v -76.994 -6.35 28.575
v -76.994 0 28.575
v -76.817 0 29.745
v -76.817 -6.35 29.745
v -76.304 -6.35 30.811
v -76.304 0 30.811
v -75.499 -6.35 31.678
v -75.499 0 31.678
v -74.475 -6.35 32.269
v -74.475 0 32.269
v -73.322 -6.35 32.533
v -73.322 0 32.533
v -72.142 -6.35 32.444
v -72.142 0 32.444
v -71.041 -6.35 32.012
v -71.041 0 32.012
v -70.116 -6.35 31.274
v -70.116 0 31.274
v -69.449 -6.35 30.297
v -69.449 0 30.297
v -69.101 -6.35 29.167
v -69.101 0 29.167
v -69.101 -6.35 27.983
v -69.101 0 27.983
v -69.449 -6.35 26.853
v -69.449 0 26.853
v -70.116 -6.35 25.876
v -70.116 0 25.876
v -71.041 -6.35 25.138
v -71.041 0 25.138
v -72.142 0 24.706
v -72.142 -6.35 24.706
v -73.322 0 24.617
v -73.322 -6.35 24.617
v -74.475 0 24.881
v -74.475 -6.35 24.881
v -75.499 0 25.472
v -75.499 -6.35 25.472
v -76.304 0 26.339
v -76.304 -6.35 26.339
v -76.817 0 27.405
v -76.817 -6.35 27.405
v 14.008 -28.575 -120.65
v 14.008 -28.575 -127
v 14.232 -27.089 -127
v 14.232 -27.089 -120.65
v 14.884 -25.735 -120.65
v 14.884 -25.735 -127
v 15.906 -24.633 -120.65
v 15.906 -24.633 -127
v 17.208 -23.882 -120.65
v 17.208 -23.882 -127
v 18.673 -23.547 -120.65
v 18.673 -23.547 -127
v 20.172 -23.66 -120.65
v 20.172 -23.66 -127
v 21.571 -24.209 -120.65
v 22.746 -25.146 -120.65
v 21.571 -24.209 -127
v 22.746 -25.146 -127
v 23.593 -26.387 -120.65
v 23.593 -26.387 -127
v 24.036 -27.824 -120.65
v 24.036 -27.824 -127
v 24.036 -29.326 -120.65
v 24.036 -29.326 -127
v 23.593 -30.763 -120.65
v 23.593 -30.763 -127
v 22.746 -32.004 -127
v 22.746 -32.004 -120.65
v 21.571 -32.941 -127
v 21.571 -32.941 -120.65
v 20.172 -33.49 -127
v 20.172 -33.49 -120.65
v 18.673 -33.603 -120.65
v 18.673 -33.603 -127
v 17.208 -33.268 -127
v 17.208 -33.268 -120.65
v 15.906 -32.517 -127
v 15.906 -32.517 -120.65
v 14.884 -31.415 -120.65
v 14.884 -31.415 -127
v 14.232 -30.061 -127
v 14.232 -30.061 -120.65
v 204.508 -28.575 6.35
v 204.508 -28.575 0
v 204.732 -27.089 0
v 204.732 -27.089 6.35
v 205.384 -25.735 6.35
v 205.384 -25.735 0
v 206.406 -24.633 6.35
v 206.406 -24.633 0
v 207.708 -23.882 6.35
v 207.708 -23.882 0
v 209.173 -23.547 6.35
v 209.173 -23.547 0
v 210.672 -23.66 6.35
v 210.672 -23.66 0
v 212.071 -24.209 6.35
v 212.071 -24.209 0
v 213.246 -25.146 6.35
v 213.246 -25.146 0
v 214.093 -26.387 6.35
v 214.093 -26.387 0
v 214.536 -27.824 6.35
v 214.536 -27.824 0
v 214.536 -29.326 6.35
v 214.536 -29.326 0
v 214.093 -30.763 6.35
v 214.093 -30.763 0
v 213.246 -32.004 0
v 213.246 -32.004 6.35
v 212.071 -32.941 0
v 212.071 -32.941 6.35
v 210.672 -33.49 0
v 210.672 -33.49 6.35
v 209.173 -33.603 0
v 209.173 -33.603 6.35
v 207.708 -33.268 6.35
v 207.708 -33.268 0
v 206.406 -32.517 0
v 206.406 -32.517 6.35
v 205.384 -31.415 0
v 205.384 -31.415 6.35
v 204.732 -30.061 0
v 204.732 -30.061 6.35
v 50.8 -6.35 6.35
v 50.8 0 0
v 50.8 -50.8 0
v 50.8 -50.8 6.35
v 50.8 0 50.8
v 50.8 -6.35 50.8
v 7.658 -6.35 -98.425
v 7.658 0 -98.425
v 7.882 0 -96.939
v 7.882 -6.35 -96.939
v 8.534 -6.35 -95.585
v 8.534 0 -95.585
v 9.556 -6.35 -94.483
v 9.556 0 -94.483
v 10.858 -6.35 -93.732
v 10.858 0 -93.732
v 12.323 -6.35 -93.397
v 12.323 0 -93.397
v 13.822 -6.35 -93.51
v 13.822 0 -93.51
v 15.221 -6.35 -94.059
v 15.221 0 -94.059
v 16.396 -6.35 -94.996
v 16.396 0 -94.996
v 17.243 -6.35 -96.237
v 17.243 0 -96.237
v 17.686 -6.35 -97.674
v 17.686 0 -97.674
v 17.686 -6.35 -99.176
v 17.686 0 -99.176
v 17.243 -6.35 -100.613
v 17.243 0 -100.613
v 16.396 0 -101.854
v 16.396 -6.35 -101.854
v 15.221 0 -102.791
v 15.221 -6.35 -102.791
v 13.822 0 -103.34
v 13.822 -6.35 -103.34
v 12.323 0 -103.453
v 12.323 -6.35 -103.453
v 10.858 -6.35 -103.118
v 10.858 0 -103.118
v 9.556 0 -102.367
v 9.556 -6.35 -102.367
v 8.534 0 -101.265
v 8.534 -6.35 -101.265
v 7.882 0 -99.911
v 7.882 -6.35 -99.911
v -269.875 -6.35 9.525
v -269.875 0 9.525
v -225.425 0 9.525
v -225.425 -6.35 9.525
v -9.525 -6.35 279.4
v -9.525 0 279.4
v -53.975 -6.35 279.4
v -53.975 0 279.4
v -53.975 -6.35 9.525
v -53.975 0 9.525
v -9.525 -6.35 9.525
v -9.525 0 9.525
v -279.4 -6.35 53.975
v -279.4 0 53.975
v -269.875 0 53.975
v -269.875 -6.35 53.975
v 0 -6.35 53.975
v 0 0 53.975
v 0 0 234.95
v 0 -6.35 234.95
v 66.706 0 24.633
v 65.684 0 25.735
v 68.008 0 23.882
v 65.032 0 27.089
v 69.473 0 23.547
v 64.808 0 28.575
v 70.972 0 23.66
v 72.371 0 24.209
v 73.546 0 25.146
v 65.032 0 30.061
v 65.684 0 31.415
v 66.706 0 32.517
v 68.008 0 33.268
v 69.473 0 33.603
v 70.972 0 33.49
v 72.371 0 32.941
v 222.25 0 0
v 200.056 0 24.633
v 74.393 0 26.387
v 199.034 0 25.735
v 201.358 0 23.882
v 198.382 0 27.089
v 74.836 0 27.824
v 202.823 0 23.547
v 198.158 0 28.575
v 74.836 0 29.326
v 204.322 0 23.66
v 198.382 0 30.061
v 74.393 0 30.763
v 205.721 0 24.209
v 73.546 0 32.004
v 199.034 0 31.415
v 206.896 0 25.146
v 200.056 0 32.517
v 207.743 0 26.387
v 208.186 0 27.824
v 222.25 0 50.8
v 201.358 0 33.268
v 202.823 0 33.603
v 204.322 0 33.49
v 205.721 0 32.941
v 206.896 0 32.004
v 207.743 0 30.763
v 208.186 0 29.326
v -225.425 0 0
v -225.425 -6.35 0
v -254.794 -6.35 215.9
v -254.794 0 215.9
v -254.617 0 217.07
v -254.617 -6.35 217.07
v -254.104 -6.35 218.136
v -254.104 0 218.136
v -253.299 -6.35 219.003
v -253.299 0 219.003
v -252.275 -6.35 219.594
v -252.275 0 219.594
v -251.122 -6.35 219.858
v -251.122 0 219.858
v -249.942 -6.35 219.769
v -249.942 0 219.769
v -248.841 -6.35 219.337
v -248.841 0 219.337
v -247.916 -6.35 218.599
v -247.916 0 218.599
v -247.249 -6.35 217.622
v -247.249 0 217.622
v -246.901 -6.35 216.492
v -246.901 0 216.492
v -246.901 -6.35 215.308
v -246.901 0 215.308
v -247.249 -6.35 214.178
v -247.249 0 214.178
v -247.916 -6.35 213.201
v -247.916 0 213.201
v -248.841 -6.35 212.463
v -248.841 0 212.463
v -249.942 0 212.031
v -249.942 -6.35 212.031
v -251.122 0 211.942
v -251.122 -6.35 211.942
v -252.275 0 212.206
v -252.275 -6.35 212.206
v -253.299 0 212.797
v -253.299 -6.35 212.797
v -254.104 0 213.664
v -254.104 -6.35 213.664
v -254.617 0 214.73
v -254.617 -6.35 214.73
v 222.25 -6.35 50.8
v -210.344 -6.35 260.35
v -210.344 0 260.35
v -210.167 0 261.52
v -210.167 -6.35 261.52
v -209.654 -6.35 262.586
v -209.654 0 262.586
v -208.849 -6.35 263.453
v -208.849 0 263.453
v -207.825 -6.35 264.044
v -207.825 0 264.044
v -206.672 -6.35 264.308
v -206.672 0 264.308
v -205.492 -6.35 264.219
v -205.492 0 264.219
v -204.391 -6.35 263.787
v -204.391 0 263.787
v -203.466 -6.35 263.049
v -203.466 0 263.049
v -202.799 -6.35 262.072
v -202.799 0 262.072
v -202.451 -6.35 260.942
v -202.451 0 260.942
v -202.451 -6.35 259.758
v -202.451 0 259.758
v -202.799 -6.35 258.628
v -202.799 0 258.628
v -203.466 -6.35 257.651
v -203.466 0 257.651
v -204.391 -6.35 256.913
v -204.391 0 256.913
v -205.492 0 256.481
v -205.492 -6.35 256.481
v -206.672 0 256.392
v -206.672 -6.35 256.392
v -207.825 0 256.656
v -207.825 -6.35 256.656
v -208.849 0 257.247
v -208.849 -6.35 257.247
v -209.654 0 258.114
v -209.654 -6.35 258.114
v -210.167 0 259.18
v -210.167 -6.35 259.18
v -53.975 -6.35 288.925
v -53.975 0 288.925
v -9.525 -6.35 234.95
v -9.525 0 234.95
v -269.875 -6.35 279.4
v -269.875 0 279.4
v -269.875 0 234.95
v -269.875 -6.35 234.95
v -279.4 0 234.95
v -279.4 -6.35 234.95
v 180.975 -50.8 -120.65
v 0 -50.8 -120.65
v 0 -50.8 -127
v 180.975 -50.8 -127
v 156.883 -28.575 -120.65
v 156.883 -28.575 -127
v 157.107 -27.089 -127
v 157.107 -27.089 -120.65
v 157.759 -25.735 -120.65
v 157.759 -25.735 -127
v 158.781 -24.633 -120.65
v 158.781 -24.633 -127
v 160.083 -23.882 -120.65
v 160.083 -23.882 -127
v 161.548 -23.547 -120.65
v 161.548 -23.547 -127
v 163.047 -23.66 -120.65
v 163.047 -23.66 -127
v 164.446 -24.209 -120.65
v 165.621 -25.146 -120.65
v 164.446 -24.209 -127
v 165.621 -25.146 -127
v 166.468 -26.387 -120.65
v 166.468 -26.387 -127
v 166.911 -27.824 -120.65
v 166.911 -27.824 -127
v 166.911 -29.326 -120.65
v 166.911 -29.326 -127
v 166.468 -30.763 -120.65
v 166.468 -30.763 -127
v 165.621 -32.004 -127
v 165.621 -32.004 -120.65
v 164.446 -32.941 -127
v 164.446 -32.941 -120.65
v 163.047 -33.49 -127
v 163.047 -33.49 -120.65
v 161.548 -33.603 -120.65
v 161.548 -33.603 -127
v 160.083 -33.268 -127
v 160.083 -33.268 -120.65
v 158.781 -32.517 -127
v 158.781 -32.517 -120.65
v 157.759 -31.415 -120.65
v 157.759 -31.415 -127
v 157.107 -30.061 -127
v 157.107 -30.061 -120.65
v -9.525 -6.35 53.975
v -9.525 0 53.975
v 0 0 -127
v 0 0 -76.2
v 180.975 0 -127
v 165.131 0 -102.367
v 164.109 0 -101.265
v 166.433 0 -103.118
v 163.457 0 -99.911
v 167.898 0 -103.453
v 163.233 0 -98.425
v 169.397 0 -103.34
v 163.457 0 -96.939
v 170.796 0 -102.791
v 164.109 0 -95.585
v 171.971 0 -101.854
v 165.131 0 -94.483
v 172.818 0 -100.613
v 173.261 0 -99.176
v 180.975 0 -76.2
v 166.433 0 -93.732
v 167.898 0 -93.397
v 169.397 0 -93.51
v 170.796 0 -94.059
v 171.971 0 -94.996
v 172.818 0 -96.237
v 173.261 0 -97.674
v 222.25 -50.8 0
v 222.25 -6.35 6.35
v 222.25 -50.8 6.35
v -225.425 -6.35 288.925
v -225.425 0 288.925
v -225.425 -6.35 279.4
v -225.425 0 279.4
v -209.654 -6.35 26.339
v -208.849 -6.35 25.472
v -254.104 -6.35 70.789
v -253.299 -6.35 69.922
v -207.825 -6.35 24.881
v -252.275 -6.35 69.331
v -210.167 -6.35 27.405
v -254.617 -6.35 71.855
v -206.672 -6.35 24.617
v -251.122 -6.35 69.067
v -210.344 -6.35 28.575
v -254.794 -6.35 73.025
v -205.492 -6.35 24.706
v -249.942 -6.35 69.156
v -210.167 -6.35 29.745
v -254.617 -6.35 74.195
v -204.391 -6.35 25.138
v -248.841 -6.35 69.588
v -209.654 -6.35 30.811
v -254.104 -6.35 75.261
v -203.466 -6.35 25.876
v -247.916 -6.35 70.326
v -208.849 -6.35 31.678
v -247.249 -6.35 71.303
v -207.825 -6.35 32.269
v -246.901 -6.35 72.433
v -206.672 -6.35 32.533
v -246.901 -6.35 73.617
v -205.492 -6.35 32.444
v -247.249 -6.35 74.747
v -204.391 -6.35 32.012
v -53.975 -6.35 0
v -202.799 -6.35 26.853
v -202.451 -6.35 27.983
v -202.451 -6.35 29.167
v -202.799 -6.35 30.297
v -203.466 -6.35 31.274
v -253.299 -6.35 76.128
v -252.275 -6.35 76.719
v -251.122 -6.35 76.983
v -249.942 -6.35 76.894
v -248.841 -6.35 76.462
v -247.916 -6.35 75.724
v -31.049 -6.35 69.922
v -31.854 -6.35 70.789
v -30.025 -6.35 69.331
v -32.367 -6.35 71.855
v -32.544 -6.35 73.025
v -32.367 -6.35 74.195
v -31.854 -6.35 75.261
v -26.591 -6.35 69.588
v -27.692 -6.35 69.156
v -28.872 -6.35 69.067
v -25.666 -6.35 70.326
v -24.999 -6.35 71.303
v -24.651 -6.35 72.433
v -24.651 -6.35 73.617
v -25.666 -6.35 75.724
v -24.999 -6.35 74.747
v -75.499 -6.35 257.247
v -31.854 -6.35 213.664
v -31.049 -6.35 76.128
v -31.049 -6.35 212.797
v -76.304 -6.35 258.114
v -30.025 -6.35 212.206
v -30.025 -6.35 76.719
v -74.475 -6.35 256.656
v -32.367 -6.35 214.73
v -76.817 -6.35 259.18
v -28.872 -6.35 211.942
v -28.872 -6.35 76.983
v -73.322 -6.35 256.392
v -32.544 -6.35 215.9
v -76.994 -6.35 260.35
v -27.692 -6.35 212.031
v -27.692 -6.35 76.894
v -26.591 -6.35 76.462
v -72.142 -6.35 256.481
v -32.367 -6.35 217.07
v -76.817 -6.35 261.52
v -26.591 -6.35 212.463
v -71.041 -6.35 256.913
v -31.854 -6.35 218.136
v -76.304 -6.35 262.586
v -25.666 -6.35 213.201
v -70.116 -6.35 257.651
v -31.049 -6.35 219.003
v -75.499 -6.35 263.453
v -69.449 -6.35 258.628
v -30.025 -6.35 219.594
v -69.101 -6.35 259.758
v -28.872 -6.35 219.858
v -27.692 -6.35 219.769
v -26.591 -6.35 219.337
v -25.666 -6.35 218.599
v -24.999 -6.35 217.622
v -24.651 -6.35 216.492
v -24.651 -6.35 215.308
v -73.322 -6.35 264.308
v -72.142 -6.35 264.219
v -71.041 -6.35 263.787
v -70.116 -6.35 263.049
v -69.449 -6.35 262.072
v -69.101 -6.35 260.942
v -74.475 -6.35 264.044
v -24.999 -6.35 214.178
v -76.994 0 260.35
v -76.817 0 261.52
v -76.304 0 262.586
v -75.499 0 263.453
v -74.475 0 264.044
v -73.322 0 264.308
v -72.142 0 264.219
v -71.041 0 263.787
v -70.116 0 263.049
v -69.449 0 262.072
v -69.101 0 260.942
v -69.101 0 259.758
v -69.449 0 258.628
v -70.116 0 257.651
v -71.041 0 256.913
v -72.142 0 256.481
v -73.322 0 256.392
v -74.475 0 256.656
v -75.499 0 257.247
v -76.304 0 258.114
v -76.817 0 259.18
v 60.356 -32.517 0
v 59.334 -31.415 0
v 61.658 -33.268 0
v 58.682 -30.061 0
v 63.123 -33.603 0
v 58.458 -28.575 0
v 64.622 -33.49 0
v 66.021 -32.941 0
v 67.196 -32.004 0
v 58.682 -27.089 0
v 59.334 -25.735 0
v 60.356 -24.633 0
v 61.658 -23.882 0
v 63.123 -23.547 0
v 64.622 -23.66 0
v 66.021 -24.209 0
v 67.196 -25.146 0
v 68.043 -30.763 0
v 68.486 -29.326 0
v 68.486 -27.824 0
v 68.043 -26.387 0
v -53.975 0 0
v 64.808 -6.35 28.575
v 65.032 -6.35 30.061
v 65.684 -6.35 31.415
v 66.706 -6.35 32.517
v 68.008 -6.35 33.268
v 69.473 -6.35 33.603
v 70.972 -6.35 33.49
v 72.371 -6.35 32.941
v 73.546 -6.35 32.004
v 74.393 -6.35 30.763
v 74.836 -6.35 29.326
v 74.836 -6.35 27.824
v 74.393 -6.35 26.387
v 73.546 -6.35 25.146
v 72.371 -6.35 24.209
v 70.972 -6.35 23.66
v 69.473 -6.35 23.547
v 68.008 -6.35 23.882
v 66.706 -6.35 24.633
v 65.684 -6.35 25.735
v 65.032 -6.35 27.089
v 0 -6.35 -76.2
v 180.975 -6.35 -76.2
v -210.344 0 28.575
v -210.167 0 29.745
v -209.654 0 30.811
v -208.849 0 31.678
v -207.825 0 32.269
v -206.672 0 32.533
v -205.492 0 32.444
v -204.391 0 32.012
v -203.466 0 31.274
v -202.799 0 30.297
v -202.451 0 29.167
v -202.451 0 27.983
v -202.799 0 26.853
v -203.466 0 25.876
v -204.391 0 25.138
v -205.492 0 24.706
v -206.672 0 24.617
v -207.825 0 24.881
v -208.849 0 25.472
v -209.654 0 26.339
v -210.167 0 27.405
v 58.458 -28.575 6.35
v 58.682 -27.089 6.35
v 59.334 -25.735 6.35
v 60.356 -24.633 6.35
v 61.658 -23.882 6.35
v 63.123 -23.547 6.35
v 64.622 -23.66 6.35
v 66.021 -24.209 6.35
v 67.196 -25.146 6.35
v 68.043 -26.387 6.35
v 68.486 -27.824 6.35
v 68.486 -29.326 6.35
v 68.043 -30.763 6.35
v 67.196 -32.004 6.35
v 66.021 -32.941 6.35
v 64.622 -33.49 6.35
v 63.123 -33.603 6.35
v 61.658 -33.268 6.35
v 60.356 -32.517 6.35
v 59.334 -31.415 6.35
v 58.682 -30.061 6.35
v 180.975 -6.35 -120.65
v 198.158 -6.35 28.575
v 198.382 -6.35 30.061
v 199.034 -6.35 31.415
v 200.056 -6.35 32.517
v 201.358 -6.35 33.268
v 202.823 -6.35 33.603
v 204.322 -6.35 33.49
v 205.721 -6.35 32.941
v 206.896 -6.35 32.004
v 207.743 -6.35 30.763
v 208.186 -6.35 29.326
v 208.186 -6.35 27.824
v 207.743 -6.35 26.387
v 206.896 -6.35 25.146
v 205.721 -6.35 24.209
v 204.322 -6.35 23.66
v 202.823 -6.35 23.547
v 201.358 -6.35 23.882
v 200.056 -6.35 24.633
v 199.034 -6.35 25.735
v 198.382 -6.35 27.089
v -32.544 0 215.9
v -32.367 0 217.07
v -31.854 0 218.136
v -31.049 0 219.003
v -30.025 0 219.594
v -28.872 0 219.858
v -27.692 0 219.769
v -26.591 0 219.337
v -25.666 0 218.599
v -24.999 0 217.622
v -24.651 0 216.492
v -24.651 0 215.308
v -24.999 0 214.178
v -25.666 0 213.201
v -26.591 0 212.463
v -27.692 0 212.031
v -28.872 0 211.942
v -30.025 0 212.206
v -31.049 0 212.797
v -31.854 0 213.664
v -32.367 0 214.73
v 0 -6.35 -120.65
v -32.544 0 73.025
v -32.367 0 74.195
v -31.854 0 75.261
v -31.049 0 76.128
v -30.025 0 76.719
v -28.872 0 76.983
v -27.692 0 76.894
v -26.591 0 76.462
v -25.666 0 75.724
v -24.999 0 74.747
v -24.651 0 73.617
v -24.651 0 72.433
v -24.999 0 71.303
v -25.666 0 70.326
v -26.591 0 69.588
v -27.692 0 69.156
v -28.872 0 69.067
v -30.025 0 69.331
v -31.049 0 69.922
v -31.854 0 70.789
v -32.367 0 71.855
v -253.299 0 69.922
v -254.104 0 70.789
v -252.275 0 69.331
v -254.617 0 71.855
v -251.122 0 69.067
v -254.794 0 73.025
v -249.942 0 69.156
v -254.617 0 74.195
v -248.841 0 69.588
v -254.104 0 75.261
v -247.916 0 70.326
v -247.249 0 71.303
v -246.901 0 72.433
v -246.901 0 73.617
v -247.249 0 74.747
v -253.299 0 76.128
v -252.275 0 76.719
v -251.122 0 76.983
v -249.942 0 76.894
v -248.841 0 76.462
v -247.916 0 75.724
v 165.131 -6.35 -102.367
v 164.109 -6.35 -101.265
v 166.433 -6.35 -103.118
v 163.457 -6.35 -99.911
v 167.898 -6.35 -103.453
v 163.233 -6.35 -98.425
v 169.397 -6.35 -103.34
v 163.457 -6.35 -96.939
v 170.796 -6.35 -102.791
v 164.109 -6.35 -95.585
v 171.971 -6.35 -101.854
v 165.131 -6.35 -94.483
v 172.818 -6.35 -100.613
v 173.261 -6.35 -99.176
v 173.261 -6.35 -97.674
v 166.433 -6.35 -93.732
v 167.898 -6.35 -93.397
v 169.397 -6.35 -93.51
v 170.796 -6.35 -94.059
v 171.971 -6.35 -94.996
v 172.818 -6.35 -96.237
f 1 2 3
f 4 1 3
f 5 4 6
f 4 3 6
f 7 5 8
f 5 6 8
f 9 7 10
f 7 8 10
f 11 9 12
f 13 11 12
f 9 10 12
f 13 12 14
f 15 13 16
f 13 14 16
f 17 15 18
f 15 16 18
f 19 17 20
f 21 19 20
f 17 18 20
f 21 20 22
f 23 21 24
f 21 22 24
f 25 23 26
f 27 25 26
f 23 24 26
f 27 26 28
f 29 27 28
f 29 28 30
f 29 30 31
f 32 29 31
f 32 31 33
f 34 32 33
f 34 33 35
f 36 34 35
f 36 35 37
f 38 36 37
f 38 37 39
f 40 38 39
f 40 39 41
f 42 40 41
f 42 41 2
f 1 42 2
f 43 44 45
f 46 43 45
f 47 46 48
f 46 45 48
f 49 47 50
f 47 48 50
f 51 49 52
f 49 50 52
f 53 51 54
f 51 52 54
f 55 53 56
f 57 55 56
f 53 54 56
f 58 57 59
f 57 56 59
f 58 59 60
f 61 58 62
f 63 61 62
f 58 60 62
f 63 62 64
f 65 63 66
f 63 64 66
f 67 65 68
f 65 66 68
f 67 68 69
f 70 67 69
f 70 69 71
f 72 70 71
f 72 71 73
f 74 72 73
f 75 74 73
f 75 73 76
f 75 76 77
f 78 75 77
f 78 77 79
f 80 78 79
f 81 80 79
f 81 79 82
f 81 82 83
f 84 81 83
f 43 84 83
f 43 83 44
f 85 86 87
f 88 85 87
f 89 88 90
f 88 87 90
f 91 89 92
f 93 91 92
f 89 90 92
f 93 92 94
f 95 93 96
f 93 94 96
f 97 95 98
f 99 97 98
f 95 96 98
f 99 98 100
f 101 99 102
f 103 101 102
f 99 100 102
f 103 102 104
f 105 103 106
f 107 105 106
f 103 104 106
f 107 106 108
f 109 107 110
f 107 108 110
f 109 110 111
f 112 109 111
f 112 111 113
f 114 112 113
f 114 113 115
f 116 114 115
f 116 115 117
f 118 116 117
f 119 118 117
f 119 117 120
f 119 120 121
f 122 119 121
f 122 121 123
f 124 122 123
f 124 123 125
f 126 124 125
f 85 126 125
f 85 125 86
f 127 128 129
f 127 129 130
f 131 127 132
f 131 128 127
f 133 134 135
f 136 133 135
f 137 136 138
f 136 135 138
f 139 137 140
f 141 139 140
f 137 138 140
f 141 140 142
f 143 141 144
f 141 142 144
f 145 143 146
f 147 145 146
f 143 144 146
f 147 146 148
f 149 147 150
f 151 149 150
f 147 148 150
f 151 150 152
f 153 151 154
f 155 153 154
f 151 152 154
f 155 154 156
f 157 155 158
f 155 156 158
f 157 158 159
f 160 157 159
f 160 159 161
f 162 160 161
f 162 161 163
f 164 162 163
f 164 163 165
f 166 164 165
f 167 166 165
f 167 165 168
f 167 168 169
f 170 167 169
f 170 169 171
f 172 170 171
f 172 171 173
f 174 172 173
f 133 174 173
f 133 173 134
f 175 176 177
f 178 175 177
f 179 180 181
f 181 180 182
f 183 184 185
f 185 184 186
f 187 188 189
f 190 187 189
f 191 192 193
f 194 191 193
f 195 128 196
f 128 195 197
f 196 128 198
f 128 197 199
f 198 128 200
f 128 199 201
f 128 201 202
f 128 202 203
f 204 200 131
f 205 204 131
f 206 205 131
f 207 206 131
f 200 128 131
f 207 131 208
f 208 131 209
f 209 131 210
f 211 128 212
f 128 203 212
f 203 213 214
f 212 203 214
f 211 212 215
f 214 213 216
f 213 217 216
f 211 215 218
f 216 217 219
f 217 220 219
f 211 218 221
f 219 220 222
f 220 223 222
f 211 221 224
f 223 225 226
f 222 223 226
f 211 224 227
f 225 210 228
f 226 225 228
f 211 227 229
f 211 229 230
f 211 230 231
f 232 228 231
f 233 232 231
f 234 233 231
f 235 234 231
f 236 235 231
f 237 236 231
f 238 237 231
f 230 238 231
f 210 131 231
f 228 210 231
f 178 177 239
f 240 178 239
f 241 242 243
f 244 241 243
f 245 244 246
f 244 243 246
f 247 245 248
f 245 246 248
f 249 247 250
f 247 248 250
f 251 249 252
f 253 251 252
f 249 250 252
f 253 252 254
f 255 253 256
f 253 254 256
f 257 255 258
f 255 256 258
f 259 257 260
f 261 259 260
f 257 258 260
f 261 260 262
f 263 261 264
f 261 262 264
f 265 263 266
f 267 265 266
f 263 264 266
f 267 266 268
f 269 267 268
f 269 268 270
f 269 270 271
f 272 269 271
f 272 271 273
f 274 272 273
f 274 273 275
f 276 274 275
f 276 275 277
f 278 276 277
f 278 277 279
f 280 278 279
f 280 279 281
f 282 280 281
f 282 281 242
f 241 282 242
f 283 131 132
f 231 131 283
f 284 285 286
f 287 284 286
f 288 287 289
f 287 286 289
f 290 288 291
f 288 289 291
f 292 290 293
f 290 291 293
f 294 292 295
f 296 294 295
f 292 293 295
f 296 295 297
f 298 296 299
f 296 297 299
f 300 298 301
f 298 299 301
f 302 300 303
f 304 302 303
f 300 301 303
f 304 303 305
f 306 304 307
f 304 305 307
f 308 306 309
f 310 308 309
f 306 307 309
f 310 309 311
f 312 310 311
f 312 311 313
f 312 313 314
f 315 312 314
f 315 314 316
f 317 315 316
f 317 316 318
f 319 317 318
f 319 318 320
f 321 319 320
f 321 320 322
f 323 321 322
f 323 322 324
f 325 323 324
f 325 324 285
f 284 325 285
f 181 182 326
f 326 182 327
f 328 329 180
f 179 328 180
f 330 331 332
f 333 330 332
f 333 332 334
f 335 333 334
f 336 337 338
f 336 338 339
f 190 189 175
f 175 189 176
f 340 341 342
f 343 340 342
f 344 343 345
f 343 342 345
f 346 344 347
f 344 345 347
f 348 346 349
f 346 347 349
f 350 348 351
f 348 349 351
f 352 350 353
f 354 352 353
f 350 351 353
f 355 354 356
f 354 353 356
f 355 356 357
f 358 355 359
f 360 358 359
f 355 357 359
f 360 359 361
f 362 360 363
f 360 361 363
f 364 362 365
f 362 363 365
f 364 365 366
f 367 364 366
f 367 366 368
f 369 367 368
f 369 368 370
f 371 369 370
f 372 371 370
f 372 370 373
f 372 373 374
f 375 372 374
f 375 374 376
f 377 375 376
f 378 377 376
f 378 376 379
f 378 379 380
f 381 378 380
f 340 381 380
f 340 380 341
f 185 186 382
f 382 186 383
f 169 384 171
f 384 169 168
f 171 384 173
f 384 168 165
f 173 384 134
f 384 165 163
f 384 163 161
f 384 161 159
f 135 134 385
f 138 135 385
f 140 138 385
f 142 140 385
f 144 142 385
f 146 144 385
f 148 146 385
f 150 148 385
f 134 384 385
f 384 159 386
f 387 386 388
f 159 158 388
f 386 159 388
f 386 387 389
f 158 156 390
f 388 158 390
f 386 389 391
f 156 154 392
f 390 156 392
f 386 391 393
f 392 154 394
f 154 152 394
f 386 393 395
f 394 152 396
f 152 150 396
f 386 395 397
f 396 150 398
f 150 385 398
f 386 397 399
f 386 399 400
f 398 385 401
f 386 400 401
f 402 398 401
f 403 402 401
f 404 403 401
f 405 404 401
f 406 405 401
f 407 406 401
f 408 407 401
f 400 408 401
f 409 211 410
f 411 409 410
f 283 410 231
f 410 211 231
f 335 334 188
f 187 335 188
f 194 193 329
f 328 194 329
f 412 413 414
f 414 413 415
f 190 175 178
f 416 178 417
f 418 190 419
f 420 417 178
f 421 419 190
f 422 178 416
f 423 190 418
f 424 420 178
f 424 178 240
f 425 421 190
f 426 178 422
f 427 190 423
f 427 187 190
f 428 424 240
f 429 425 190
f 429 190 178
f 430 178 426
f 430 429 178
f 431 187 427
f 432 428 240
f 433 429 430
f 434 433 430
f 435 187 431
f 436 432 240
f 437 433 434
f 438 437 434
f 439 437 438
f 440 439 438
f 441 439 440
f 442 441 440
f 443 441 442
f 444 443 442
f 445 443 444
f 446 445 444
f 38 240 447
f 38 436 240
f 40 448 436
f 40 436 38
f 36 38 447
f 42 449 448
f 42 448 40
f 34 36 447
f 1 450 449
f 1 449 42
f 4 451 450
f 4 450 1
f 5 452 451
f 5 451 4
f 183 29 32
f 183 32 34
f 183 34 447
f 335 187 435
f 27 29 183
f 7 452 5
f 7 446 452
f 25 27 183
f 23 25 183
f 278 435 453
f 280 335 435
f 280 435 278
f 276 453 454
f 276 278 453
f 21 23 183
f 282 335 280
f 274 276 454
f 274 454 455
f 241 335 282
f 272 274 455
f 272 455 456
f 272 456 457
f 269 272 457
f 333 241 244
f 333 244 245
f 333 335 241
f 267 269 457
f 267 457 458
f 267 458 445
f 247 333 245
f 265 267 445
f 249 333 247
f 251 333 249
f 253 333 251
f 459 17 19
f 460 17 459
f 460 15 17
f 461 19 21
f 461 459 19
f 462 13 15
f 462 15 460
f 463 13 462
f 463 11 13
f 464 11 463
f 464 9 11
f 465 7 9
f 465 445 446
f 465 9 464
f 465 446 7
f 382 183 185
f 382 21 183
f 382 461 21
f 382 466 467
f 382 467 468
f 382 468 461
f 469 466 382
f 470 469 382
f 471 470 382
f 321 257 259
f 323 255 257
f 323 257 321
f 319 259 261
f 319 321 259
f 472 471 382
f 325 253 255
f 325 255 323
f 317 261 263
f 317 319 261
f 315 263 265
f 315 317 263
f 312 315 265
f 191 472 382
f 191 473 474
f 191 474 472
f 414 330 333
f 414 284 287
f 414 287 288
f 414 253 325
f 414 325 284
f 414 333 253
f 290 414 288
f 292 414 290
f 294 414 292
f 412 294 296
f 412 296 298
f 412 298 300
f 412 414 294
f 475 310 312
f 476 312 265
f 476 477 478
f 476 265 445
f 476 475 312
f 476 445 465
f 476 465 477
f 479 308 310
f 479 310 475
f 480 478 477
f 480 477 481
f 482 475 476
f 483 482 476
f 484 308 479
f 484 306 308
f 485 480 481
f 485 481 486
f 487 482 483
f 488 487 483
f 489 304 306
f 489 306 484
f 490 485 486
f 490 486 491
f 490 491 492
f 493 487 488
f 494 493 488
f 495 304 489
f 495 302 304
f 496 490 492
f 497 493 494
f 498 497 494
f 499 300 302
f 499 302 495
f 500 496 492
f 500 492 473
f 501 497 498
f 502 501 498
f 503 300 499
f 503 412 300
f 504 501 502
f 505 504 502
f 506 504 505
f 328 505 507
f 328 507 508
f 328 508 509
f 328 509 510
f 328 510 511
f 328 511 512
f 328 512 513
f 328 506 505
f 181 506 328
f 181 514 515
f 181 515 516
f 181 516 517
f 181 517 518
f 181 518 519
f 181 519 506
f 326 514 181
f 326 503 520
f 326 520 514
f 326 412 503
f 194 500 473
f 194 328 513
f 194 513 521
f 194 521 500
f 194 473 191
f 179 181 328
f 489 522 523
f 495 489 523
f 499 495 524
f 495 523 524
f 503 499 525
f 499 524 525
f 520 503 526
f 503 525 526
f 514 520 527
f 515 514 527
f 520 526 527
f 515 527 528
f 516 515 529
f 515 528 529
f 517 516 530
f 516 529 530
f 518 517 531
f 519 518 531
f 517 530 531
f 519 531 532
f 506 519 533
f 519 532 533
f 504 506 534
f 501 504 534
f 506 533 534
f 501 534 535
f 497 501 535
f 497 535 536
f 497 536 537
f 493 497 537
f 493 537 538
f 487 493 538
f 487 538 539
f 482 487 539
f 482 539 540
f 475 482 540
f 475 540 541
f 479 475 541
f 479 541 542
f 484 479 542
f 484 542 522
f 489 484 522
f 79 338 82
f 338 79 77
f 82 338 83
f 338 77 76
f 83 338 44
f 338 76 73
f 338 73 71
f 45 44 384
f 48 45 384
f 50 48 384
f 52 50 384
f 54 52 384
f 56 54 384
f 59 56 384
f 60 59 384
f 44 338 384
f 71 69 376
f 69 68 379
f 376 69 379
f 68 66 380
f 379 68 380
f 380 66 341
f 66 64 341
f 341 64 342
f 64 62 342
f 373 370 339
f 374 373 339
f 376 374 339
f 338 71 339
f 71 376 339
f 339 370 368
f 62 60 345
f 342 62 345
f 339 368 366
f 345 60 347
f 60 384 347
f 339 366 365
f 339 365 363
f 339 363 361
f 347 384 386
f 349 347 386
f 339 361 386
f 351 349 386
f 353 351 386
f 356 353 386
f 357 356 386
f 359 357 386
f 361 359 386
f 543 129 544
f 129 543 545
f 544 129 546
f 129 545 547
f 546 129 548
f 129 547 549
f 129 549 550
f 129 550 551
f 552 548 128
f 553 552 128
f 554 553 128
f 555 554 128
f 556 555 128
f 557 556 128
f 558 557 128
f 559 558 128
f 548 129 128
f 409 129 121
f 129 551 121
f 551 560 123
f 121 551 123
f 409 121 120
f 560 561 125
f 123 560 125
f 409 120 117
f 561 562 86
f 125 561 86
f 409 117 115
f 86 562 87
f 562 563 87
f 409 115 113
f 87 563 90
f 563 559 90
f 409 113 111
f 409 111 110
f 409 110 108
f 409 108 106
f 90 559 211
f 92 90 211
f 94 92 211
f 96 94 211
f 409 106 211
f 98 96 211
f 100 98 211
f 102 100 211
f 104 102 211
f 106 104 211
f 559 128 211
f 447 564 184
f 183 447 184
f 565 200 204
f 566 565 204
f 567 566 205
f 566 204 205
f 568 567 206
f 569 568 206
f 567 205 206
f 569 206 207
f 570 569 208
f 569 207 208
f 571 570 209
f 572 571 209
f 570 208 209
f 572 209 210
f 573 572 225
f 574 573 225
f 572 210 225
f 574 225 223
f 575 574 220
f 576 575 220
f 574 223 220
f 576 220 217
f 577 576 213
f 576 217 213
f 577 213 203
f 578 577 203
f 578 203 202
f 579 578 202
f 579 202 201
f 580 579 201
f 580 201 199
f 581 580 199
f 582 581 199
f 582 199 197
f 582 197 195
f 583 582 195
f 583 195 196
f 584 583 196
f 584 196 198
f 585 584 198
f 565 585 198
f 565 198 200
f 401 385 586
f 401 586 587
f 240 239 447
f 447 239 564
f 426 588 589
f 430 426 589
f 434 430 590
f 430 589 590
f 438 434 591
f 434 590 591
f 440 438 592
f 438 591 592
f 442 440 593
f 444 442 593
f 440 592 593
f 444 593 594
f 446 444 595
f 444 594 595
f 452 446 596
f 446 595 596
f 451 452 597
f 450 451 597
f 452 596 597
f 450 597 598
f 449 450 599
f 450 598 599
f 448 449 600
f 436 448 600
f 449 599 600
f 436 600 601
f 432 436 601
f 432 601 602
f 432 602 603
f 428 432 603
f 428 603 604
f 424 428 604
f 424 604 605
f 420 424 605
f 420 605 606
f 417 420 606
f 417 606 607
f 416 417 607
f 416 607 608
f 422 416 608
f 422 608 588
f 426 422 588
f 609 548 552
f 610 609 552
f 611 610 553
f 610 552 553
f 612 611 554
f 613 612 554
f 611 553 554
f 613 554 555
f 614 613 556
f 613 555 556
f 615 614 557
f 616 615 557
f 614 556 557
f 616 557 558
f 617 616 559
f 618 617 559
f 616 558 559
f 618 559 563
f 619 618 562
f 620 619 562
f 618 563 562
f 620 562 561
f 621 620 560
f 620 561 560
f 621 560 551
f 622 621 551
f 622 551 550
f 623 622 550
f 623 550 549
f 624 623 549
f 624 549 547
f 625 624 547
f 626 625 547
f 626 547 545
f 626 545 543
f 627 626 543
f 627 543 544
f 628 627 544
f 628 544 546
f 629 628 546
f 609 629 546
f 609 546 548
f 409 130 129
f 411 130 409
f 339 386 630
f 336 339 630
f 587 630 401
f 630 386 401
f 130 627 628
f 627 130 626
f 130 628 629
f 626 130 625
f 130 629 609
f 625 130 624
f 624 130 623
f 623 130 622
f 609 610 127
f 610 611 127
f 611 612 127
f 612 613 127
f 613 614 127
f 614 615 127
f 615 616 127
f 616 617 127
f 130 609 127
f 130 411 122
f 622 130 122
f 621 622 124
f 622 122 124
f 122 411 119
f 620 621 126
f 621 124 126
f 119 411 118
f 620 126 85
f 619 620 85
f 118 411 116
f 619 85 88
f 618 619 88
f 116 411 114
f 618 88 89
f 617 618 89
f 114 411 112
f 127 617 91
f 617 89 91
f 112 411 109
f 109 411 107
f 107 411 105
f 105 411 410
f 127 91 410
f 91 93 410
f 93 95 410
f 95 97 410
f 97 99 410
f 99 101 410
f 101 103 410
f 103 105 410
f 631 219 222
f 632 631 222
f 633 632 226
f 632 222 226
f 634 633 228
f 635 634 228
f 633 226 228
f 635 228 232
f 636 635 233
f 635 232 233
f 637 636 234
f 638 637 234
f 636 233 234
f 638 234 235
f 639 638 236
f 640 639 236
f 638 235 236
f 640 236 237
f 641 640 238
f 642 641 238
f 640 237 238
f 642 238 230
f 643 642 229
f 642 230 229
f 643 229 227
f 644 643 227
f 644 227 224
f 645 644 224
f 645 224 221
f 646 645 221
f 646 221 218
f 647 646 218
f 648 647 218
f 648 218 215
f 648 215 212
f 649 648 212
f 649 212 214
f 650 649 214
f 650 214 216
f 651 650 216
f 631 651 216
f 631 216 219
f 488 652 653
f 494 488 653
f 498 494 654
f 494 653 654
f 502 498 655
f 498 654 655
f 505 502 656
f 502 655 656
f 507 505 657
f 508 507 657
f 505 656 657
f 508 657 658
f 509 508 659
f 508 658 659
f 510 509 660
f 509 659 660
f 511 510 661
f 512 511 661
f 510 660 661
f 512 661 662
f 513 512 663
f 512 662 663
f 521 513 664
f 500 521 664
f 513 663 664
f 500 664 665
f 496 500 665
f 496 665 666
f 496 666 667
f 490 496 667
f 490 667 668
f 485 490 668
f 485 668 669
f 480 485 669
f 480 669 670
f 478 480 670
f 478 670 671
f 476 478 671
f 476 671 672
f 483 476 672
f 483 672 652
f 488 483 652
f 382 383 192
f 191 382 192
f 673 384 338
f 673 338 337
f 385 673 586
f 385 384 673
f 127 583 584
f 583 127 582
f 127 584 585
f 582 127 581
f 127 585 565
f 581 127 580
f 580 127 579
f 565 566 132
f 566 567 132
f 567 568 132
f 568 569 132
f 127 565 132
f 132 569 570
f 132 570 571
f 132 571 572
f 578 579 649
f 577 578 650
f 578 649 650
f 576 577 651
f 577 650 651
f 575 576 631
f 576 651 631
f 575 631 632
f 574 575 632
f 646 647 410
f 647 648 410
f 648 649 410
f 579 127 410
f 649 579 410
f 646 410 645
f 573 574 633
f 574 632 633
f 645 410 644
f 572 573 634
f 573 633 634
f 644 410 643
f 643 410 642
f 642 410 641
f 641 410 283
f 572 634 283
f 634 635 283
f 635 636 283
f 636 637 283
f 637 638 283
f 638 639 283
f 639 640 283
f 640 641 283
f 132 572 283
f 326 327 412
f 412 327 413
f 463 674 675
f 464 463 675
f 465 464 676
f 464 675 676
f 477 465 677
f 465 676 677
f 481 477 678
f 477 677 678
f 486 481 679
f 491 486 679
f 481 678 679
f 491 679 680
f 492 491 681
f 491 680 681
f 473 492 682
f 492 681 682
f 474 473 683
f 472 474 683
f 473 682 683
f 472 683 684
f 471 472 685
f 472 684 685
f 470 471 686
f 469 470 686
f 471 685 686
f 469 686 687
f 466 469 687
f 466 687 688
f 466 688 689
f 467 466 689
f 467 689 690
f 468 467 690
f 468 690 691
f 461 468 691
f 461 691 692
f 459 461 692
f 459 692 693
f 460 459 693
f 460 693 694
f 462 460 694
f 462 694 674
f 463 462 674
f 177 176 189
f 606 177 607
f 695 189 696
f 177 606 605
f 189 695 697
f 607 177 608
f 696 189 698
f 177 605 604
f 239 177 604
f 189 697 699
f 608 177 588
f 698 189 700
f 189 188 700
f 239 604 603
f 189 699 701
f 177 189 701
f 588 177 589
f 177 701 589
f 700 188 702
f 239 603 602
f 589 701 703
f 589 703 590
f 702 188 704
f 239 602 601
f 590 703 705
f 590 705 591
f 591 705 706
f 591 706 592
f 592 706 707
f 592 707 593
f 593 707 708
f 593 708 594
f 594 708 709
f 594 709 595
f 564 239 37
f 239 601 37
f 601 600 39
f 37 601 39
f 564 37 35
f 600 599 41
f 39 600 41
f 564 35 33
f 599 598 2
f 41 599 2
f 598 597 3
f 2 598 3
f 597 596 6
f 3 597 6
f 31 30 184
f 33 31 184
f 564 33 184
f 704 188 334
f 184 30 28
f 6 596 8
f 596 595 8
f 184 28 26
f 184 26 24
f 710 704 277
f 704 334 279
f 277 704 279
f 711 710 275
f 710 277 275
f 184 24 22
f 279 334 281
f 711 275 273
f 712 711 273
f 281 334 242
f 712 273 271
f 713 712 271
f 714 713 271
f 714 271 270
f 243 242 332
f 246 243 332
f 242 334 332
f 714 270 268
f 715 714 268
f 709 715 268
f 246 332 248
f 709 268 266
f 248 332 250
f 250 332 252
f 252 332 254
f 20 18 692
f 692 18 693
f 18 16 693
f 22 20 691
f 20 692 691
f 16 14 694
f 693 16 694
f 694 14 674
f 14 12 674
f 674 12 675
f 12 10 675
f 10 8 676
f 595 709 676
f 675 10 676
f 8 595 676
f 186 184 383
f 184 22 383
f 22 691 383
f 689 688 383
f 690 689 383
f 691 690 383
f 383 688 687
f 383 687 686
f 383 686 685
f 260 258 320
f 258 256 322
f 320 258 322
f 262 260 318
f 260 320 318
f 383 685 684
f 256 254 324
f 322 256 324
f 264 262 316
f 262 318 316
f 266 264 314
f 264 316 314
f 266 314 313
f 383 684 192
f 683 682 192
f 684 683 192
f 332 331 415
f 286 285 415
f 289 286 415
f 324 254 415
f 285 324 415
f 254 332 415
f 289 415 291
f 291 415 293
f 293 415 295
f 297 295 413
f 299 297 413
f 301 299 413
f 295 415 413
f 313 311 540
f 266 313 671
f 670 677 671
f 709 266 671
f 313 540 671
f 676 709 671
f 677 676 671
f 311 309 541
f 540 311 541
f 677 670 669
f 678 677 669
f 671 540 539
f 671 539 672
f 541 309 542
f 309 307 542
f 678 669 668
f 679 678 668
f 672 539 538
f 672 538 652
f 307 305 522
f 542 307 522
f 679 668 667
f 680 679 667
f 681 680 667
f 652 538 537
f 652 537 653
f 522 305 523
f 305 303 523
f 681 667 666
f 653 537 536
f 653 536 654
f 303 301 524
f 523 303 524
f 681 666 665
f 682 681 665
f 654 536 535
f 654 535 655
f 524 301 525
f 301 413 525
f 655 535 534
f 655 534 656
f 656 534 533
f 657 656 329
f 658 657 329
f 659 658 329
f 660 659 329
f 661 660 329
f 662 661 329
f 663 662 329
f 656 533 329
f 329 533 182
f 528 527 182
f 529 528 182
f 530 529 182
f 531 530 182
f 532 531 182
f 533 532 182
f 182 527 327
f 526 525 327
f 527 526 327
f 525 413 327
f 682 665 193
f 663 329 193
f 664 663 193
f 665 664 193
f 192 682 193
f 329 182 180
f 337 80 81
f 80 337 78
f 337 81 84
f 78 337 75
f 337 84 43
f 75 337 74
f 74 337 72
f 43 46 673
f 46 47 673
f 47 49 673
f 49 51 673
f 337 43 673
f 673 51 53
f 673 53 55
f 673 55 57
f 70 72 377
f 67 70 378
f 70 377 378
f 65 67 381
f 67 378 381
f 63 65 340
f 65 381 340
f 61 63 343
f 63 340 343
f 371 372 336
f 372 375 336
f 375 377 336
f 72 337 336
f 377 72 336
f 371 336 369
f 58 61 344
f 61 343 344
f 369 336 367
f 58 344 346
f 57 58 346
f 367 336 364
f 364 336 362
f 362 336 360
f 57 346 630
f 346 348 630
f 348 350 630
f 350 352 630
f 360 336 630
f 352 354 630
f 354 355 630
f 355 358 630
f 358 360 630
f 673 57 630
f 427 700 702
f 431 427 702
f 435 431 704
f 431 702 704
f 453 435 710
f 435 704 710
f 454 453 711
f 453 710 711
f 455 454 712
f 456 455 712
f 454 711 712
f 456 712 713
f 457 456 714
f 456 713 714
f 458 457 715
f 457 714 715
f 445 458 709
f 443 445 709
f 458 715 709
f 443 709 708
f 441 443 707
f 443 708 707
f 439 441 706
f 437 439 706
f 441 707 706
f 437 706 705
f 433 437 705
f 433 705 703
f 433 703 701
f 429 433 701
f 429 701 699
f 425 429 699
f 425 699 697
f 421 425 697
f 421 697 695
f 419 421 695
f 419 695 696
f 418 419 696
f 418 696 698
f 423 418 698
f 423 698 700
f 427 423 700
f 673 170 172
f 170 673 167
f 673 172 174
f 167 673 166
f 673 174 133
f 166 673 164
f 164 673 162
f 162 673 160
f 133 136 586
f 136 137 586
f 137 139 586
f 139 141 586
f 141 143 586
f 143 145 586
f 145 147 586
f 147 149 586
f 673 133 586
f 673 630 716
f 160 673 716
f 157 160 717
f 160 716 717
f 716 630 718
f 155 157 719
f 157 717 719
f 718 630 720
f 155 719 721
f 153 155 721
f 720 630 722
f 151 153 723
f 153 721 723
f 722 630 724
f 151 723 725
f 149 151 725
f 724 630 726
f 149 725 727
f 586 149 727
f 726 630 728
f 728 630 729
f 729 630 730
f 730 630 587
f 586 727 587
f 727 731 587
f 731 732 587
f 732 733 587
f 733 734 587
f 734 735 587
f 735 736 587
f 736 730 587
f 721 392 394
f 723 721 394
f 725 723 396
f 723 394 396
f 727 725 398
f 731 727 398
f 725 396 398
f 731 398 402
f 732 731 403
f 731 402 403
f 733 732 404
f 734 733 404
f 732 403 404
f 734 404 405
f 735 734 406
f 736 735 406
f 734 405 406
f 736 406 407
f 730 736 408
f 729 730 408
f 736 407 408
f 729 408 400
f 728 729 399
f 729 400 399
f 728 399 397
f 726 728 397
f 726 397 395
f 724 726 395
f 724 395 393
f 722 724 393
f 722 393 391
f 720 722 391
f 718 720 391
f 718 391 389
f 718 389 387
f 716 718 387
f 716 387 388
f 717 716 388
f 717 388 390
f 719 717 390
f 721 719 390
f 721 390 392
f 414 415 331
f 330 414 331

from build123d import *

# Parameters (mm, degrees)
F1_DEPTH         = 6.35
F3_D             = 7.9375
F3_DEPTH         = 20.6756
F3_TIP           = 2.3846655818
F4_W             = 171.45
F4_H             = 50.8
F5_DEPTH         = 50.8
F6_W             = 44.45
F6_H             = 44.45
F7_DEPTH         = 171.45
F10_D            = 10.0838
F10_DEPTH        = 20.6756
F10_TIP          = 3.0294791551
F10_ON_F8_D      = 10.0838
F10_ON_F8_DEPTH  = 20.6756
F10_ON_F8_TIP    = 3.0294791551
F11_W            = 180.975
F11_H            = 50.8
F12_DEPTH        = 50.8
F13_W            = 44.45
F13_H            = 44.45
F14_DEPTH        = 180.975
F17_D            = 10.0838
F17_DEPTH        = 20.6756
F17_TIP          = 3.0294791551
F17_ON_F16_D     = 10.0838
F17_ON_F16_DEPTH = 20.6756
F17_ON_F16_TIP   = 3.0294791551


with BuildPart() as f1:
    # F0 (on Front) → F1 (new body)
    with BuildSketch(Plane.XZ):
        Polygon((-225.425, 0), (-53.975, 0), (-53.975, 9.525), (-9.525, 9.525), (-9.525, 53.975), (0, 53.975), (0, 234.95), (-9.525, 234.95), (-9.525, 279.4), (-53.975, 279.4), (-53.975, 288.925), (-225.425, 288.925), (-225.425, 279.4), (-269.875, 279.4), (-269.875, 234.95), (-279.4, 234.95), (-279.4, 53.975), (-269.875, 53.975), (-269.875, 9.525), (-225.425, 9.525), align=None)
    extrude(amount=F1_DEPTH)

    # F3
    with Locations(Plane.XZ.offset(6.35)):
        with Locations((-28.575, 73.025), (-73.025, 28.575), (-250.825, 73.025), (-206.375, 28.575), (-250.825, 215.9), (-206.375, 260.35), (-73.025, 260.35), (-28.575, 215.9)):
            Hole(F3_D / 2, depth=F3_DEPTH)
            with Locations((0, 0, -(F3_DEPTH + F3_TIP / 2))):  # 118° drill point
                Cone(0, F3_D / 2, F3_TIP, mode=Mode.SUBTRACT)


with BuildPart() as f5:
    # F4 (on Front) → F5 (new body)
    with BuildSketch(Plane.XZ):
        with Locations((136.525, 25.4)):
            Rectangle(F4_W, F4_H)
    extrude(amount=F5_DEPTH)

    # F6 (on face) → F7 (cut)
    with BuildSketch(Plane.YZ.offset(222.25)):
        with Locations((-28.575, 28.575)):
            Rectangle(F6_W, F6_H)
    extrude(amount=-F7_DEPTH, mode=Mode.SUBTRACT)

    # F10
    with Locations(Plane.XZ.offset(6.35)):
        with Locations((69.85, 28.575), (203.2, 28.575)):
            Hole(F10_D / 2, depth=F10_DEPTH)
            with Locations((0, 0, -(F10_DEPTH + F10_TIP / 2))):  # 118° drill point
                Cone(0, F10_D / 2, F10_TIP, mode=Mode.SUBTRACT)

    # F10 on F8
    with Locations(Plane.XY.offset(6.35)):
        with Locations((63.5, -28.575), (209.55, -28.575)):
            Hole(F10_ON_F8_D / 2, depth=F10_ON_F8_DEPTH)
            with Locations((0, 0, -(F10_ON_F8_DEPTH + F10_ON_F8_TIP / 2))):  # 118° drill point
                Cone(0, F10_ON_F8_D / 2, F10_ON_F8_TIP, mode=Mode.SUBTRACT)


with BuildPart() as f12:
    # F11 (on Front) → F12 (new body)
    with BuildSketch(Plane.XZ):
        with Locations((90.4875, -101.6)):
            Rectangle(F11_W, F11_H)
    extrude(amount=F12_DEPTH)

    # F13 (on face) → F14 (cut)
    with BuildSketch(Plane.YZ.offset(180.975)):
        with Locations((-28.575, -98.425)):
            Rectangle(F13_W, F13_H)
    extrude(amount=-F14_DEPTH, mode=Mode.SUBTRACT)

    # F17
    with Locations(Plane.XZ.offset(6.35)):
        with Locations((12.7, -98.425), (168.275, -98.425)):
            Hole(F17_D / 2, depth=F17_DEPTH)
            with Locations((0, 0, -(F17_DEPTH + F17_TIP / 2))):  # 118° drill point
                Cone(0, F17_D / 2, F17_TIP, mode=Mode.SUBTRACT)

    # F17 on F16
    with Locations(Plane.XY.offset(-120.65)):
        with Locations((19.05, -28.575), (161.925, -28.575)):
            Hole(F17_ON_F16_D / 2, depth=F17_ON_F16_DEPTH)
            with Locations((0, 0, -(F17_ON_F16_DEPTH + F17_ON_F16_TIP / 2))):  # 118° drill point
                Cone(0, F17_ON_F16_D / 2, F17_ON_F16_TIP, mode=Mode.SUBTRACT)


solid = Compound([f1.part, f5.part, f12.part])
